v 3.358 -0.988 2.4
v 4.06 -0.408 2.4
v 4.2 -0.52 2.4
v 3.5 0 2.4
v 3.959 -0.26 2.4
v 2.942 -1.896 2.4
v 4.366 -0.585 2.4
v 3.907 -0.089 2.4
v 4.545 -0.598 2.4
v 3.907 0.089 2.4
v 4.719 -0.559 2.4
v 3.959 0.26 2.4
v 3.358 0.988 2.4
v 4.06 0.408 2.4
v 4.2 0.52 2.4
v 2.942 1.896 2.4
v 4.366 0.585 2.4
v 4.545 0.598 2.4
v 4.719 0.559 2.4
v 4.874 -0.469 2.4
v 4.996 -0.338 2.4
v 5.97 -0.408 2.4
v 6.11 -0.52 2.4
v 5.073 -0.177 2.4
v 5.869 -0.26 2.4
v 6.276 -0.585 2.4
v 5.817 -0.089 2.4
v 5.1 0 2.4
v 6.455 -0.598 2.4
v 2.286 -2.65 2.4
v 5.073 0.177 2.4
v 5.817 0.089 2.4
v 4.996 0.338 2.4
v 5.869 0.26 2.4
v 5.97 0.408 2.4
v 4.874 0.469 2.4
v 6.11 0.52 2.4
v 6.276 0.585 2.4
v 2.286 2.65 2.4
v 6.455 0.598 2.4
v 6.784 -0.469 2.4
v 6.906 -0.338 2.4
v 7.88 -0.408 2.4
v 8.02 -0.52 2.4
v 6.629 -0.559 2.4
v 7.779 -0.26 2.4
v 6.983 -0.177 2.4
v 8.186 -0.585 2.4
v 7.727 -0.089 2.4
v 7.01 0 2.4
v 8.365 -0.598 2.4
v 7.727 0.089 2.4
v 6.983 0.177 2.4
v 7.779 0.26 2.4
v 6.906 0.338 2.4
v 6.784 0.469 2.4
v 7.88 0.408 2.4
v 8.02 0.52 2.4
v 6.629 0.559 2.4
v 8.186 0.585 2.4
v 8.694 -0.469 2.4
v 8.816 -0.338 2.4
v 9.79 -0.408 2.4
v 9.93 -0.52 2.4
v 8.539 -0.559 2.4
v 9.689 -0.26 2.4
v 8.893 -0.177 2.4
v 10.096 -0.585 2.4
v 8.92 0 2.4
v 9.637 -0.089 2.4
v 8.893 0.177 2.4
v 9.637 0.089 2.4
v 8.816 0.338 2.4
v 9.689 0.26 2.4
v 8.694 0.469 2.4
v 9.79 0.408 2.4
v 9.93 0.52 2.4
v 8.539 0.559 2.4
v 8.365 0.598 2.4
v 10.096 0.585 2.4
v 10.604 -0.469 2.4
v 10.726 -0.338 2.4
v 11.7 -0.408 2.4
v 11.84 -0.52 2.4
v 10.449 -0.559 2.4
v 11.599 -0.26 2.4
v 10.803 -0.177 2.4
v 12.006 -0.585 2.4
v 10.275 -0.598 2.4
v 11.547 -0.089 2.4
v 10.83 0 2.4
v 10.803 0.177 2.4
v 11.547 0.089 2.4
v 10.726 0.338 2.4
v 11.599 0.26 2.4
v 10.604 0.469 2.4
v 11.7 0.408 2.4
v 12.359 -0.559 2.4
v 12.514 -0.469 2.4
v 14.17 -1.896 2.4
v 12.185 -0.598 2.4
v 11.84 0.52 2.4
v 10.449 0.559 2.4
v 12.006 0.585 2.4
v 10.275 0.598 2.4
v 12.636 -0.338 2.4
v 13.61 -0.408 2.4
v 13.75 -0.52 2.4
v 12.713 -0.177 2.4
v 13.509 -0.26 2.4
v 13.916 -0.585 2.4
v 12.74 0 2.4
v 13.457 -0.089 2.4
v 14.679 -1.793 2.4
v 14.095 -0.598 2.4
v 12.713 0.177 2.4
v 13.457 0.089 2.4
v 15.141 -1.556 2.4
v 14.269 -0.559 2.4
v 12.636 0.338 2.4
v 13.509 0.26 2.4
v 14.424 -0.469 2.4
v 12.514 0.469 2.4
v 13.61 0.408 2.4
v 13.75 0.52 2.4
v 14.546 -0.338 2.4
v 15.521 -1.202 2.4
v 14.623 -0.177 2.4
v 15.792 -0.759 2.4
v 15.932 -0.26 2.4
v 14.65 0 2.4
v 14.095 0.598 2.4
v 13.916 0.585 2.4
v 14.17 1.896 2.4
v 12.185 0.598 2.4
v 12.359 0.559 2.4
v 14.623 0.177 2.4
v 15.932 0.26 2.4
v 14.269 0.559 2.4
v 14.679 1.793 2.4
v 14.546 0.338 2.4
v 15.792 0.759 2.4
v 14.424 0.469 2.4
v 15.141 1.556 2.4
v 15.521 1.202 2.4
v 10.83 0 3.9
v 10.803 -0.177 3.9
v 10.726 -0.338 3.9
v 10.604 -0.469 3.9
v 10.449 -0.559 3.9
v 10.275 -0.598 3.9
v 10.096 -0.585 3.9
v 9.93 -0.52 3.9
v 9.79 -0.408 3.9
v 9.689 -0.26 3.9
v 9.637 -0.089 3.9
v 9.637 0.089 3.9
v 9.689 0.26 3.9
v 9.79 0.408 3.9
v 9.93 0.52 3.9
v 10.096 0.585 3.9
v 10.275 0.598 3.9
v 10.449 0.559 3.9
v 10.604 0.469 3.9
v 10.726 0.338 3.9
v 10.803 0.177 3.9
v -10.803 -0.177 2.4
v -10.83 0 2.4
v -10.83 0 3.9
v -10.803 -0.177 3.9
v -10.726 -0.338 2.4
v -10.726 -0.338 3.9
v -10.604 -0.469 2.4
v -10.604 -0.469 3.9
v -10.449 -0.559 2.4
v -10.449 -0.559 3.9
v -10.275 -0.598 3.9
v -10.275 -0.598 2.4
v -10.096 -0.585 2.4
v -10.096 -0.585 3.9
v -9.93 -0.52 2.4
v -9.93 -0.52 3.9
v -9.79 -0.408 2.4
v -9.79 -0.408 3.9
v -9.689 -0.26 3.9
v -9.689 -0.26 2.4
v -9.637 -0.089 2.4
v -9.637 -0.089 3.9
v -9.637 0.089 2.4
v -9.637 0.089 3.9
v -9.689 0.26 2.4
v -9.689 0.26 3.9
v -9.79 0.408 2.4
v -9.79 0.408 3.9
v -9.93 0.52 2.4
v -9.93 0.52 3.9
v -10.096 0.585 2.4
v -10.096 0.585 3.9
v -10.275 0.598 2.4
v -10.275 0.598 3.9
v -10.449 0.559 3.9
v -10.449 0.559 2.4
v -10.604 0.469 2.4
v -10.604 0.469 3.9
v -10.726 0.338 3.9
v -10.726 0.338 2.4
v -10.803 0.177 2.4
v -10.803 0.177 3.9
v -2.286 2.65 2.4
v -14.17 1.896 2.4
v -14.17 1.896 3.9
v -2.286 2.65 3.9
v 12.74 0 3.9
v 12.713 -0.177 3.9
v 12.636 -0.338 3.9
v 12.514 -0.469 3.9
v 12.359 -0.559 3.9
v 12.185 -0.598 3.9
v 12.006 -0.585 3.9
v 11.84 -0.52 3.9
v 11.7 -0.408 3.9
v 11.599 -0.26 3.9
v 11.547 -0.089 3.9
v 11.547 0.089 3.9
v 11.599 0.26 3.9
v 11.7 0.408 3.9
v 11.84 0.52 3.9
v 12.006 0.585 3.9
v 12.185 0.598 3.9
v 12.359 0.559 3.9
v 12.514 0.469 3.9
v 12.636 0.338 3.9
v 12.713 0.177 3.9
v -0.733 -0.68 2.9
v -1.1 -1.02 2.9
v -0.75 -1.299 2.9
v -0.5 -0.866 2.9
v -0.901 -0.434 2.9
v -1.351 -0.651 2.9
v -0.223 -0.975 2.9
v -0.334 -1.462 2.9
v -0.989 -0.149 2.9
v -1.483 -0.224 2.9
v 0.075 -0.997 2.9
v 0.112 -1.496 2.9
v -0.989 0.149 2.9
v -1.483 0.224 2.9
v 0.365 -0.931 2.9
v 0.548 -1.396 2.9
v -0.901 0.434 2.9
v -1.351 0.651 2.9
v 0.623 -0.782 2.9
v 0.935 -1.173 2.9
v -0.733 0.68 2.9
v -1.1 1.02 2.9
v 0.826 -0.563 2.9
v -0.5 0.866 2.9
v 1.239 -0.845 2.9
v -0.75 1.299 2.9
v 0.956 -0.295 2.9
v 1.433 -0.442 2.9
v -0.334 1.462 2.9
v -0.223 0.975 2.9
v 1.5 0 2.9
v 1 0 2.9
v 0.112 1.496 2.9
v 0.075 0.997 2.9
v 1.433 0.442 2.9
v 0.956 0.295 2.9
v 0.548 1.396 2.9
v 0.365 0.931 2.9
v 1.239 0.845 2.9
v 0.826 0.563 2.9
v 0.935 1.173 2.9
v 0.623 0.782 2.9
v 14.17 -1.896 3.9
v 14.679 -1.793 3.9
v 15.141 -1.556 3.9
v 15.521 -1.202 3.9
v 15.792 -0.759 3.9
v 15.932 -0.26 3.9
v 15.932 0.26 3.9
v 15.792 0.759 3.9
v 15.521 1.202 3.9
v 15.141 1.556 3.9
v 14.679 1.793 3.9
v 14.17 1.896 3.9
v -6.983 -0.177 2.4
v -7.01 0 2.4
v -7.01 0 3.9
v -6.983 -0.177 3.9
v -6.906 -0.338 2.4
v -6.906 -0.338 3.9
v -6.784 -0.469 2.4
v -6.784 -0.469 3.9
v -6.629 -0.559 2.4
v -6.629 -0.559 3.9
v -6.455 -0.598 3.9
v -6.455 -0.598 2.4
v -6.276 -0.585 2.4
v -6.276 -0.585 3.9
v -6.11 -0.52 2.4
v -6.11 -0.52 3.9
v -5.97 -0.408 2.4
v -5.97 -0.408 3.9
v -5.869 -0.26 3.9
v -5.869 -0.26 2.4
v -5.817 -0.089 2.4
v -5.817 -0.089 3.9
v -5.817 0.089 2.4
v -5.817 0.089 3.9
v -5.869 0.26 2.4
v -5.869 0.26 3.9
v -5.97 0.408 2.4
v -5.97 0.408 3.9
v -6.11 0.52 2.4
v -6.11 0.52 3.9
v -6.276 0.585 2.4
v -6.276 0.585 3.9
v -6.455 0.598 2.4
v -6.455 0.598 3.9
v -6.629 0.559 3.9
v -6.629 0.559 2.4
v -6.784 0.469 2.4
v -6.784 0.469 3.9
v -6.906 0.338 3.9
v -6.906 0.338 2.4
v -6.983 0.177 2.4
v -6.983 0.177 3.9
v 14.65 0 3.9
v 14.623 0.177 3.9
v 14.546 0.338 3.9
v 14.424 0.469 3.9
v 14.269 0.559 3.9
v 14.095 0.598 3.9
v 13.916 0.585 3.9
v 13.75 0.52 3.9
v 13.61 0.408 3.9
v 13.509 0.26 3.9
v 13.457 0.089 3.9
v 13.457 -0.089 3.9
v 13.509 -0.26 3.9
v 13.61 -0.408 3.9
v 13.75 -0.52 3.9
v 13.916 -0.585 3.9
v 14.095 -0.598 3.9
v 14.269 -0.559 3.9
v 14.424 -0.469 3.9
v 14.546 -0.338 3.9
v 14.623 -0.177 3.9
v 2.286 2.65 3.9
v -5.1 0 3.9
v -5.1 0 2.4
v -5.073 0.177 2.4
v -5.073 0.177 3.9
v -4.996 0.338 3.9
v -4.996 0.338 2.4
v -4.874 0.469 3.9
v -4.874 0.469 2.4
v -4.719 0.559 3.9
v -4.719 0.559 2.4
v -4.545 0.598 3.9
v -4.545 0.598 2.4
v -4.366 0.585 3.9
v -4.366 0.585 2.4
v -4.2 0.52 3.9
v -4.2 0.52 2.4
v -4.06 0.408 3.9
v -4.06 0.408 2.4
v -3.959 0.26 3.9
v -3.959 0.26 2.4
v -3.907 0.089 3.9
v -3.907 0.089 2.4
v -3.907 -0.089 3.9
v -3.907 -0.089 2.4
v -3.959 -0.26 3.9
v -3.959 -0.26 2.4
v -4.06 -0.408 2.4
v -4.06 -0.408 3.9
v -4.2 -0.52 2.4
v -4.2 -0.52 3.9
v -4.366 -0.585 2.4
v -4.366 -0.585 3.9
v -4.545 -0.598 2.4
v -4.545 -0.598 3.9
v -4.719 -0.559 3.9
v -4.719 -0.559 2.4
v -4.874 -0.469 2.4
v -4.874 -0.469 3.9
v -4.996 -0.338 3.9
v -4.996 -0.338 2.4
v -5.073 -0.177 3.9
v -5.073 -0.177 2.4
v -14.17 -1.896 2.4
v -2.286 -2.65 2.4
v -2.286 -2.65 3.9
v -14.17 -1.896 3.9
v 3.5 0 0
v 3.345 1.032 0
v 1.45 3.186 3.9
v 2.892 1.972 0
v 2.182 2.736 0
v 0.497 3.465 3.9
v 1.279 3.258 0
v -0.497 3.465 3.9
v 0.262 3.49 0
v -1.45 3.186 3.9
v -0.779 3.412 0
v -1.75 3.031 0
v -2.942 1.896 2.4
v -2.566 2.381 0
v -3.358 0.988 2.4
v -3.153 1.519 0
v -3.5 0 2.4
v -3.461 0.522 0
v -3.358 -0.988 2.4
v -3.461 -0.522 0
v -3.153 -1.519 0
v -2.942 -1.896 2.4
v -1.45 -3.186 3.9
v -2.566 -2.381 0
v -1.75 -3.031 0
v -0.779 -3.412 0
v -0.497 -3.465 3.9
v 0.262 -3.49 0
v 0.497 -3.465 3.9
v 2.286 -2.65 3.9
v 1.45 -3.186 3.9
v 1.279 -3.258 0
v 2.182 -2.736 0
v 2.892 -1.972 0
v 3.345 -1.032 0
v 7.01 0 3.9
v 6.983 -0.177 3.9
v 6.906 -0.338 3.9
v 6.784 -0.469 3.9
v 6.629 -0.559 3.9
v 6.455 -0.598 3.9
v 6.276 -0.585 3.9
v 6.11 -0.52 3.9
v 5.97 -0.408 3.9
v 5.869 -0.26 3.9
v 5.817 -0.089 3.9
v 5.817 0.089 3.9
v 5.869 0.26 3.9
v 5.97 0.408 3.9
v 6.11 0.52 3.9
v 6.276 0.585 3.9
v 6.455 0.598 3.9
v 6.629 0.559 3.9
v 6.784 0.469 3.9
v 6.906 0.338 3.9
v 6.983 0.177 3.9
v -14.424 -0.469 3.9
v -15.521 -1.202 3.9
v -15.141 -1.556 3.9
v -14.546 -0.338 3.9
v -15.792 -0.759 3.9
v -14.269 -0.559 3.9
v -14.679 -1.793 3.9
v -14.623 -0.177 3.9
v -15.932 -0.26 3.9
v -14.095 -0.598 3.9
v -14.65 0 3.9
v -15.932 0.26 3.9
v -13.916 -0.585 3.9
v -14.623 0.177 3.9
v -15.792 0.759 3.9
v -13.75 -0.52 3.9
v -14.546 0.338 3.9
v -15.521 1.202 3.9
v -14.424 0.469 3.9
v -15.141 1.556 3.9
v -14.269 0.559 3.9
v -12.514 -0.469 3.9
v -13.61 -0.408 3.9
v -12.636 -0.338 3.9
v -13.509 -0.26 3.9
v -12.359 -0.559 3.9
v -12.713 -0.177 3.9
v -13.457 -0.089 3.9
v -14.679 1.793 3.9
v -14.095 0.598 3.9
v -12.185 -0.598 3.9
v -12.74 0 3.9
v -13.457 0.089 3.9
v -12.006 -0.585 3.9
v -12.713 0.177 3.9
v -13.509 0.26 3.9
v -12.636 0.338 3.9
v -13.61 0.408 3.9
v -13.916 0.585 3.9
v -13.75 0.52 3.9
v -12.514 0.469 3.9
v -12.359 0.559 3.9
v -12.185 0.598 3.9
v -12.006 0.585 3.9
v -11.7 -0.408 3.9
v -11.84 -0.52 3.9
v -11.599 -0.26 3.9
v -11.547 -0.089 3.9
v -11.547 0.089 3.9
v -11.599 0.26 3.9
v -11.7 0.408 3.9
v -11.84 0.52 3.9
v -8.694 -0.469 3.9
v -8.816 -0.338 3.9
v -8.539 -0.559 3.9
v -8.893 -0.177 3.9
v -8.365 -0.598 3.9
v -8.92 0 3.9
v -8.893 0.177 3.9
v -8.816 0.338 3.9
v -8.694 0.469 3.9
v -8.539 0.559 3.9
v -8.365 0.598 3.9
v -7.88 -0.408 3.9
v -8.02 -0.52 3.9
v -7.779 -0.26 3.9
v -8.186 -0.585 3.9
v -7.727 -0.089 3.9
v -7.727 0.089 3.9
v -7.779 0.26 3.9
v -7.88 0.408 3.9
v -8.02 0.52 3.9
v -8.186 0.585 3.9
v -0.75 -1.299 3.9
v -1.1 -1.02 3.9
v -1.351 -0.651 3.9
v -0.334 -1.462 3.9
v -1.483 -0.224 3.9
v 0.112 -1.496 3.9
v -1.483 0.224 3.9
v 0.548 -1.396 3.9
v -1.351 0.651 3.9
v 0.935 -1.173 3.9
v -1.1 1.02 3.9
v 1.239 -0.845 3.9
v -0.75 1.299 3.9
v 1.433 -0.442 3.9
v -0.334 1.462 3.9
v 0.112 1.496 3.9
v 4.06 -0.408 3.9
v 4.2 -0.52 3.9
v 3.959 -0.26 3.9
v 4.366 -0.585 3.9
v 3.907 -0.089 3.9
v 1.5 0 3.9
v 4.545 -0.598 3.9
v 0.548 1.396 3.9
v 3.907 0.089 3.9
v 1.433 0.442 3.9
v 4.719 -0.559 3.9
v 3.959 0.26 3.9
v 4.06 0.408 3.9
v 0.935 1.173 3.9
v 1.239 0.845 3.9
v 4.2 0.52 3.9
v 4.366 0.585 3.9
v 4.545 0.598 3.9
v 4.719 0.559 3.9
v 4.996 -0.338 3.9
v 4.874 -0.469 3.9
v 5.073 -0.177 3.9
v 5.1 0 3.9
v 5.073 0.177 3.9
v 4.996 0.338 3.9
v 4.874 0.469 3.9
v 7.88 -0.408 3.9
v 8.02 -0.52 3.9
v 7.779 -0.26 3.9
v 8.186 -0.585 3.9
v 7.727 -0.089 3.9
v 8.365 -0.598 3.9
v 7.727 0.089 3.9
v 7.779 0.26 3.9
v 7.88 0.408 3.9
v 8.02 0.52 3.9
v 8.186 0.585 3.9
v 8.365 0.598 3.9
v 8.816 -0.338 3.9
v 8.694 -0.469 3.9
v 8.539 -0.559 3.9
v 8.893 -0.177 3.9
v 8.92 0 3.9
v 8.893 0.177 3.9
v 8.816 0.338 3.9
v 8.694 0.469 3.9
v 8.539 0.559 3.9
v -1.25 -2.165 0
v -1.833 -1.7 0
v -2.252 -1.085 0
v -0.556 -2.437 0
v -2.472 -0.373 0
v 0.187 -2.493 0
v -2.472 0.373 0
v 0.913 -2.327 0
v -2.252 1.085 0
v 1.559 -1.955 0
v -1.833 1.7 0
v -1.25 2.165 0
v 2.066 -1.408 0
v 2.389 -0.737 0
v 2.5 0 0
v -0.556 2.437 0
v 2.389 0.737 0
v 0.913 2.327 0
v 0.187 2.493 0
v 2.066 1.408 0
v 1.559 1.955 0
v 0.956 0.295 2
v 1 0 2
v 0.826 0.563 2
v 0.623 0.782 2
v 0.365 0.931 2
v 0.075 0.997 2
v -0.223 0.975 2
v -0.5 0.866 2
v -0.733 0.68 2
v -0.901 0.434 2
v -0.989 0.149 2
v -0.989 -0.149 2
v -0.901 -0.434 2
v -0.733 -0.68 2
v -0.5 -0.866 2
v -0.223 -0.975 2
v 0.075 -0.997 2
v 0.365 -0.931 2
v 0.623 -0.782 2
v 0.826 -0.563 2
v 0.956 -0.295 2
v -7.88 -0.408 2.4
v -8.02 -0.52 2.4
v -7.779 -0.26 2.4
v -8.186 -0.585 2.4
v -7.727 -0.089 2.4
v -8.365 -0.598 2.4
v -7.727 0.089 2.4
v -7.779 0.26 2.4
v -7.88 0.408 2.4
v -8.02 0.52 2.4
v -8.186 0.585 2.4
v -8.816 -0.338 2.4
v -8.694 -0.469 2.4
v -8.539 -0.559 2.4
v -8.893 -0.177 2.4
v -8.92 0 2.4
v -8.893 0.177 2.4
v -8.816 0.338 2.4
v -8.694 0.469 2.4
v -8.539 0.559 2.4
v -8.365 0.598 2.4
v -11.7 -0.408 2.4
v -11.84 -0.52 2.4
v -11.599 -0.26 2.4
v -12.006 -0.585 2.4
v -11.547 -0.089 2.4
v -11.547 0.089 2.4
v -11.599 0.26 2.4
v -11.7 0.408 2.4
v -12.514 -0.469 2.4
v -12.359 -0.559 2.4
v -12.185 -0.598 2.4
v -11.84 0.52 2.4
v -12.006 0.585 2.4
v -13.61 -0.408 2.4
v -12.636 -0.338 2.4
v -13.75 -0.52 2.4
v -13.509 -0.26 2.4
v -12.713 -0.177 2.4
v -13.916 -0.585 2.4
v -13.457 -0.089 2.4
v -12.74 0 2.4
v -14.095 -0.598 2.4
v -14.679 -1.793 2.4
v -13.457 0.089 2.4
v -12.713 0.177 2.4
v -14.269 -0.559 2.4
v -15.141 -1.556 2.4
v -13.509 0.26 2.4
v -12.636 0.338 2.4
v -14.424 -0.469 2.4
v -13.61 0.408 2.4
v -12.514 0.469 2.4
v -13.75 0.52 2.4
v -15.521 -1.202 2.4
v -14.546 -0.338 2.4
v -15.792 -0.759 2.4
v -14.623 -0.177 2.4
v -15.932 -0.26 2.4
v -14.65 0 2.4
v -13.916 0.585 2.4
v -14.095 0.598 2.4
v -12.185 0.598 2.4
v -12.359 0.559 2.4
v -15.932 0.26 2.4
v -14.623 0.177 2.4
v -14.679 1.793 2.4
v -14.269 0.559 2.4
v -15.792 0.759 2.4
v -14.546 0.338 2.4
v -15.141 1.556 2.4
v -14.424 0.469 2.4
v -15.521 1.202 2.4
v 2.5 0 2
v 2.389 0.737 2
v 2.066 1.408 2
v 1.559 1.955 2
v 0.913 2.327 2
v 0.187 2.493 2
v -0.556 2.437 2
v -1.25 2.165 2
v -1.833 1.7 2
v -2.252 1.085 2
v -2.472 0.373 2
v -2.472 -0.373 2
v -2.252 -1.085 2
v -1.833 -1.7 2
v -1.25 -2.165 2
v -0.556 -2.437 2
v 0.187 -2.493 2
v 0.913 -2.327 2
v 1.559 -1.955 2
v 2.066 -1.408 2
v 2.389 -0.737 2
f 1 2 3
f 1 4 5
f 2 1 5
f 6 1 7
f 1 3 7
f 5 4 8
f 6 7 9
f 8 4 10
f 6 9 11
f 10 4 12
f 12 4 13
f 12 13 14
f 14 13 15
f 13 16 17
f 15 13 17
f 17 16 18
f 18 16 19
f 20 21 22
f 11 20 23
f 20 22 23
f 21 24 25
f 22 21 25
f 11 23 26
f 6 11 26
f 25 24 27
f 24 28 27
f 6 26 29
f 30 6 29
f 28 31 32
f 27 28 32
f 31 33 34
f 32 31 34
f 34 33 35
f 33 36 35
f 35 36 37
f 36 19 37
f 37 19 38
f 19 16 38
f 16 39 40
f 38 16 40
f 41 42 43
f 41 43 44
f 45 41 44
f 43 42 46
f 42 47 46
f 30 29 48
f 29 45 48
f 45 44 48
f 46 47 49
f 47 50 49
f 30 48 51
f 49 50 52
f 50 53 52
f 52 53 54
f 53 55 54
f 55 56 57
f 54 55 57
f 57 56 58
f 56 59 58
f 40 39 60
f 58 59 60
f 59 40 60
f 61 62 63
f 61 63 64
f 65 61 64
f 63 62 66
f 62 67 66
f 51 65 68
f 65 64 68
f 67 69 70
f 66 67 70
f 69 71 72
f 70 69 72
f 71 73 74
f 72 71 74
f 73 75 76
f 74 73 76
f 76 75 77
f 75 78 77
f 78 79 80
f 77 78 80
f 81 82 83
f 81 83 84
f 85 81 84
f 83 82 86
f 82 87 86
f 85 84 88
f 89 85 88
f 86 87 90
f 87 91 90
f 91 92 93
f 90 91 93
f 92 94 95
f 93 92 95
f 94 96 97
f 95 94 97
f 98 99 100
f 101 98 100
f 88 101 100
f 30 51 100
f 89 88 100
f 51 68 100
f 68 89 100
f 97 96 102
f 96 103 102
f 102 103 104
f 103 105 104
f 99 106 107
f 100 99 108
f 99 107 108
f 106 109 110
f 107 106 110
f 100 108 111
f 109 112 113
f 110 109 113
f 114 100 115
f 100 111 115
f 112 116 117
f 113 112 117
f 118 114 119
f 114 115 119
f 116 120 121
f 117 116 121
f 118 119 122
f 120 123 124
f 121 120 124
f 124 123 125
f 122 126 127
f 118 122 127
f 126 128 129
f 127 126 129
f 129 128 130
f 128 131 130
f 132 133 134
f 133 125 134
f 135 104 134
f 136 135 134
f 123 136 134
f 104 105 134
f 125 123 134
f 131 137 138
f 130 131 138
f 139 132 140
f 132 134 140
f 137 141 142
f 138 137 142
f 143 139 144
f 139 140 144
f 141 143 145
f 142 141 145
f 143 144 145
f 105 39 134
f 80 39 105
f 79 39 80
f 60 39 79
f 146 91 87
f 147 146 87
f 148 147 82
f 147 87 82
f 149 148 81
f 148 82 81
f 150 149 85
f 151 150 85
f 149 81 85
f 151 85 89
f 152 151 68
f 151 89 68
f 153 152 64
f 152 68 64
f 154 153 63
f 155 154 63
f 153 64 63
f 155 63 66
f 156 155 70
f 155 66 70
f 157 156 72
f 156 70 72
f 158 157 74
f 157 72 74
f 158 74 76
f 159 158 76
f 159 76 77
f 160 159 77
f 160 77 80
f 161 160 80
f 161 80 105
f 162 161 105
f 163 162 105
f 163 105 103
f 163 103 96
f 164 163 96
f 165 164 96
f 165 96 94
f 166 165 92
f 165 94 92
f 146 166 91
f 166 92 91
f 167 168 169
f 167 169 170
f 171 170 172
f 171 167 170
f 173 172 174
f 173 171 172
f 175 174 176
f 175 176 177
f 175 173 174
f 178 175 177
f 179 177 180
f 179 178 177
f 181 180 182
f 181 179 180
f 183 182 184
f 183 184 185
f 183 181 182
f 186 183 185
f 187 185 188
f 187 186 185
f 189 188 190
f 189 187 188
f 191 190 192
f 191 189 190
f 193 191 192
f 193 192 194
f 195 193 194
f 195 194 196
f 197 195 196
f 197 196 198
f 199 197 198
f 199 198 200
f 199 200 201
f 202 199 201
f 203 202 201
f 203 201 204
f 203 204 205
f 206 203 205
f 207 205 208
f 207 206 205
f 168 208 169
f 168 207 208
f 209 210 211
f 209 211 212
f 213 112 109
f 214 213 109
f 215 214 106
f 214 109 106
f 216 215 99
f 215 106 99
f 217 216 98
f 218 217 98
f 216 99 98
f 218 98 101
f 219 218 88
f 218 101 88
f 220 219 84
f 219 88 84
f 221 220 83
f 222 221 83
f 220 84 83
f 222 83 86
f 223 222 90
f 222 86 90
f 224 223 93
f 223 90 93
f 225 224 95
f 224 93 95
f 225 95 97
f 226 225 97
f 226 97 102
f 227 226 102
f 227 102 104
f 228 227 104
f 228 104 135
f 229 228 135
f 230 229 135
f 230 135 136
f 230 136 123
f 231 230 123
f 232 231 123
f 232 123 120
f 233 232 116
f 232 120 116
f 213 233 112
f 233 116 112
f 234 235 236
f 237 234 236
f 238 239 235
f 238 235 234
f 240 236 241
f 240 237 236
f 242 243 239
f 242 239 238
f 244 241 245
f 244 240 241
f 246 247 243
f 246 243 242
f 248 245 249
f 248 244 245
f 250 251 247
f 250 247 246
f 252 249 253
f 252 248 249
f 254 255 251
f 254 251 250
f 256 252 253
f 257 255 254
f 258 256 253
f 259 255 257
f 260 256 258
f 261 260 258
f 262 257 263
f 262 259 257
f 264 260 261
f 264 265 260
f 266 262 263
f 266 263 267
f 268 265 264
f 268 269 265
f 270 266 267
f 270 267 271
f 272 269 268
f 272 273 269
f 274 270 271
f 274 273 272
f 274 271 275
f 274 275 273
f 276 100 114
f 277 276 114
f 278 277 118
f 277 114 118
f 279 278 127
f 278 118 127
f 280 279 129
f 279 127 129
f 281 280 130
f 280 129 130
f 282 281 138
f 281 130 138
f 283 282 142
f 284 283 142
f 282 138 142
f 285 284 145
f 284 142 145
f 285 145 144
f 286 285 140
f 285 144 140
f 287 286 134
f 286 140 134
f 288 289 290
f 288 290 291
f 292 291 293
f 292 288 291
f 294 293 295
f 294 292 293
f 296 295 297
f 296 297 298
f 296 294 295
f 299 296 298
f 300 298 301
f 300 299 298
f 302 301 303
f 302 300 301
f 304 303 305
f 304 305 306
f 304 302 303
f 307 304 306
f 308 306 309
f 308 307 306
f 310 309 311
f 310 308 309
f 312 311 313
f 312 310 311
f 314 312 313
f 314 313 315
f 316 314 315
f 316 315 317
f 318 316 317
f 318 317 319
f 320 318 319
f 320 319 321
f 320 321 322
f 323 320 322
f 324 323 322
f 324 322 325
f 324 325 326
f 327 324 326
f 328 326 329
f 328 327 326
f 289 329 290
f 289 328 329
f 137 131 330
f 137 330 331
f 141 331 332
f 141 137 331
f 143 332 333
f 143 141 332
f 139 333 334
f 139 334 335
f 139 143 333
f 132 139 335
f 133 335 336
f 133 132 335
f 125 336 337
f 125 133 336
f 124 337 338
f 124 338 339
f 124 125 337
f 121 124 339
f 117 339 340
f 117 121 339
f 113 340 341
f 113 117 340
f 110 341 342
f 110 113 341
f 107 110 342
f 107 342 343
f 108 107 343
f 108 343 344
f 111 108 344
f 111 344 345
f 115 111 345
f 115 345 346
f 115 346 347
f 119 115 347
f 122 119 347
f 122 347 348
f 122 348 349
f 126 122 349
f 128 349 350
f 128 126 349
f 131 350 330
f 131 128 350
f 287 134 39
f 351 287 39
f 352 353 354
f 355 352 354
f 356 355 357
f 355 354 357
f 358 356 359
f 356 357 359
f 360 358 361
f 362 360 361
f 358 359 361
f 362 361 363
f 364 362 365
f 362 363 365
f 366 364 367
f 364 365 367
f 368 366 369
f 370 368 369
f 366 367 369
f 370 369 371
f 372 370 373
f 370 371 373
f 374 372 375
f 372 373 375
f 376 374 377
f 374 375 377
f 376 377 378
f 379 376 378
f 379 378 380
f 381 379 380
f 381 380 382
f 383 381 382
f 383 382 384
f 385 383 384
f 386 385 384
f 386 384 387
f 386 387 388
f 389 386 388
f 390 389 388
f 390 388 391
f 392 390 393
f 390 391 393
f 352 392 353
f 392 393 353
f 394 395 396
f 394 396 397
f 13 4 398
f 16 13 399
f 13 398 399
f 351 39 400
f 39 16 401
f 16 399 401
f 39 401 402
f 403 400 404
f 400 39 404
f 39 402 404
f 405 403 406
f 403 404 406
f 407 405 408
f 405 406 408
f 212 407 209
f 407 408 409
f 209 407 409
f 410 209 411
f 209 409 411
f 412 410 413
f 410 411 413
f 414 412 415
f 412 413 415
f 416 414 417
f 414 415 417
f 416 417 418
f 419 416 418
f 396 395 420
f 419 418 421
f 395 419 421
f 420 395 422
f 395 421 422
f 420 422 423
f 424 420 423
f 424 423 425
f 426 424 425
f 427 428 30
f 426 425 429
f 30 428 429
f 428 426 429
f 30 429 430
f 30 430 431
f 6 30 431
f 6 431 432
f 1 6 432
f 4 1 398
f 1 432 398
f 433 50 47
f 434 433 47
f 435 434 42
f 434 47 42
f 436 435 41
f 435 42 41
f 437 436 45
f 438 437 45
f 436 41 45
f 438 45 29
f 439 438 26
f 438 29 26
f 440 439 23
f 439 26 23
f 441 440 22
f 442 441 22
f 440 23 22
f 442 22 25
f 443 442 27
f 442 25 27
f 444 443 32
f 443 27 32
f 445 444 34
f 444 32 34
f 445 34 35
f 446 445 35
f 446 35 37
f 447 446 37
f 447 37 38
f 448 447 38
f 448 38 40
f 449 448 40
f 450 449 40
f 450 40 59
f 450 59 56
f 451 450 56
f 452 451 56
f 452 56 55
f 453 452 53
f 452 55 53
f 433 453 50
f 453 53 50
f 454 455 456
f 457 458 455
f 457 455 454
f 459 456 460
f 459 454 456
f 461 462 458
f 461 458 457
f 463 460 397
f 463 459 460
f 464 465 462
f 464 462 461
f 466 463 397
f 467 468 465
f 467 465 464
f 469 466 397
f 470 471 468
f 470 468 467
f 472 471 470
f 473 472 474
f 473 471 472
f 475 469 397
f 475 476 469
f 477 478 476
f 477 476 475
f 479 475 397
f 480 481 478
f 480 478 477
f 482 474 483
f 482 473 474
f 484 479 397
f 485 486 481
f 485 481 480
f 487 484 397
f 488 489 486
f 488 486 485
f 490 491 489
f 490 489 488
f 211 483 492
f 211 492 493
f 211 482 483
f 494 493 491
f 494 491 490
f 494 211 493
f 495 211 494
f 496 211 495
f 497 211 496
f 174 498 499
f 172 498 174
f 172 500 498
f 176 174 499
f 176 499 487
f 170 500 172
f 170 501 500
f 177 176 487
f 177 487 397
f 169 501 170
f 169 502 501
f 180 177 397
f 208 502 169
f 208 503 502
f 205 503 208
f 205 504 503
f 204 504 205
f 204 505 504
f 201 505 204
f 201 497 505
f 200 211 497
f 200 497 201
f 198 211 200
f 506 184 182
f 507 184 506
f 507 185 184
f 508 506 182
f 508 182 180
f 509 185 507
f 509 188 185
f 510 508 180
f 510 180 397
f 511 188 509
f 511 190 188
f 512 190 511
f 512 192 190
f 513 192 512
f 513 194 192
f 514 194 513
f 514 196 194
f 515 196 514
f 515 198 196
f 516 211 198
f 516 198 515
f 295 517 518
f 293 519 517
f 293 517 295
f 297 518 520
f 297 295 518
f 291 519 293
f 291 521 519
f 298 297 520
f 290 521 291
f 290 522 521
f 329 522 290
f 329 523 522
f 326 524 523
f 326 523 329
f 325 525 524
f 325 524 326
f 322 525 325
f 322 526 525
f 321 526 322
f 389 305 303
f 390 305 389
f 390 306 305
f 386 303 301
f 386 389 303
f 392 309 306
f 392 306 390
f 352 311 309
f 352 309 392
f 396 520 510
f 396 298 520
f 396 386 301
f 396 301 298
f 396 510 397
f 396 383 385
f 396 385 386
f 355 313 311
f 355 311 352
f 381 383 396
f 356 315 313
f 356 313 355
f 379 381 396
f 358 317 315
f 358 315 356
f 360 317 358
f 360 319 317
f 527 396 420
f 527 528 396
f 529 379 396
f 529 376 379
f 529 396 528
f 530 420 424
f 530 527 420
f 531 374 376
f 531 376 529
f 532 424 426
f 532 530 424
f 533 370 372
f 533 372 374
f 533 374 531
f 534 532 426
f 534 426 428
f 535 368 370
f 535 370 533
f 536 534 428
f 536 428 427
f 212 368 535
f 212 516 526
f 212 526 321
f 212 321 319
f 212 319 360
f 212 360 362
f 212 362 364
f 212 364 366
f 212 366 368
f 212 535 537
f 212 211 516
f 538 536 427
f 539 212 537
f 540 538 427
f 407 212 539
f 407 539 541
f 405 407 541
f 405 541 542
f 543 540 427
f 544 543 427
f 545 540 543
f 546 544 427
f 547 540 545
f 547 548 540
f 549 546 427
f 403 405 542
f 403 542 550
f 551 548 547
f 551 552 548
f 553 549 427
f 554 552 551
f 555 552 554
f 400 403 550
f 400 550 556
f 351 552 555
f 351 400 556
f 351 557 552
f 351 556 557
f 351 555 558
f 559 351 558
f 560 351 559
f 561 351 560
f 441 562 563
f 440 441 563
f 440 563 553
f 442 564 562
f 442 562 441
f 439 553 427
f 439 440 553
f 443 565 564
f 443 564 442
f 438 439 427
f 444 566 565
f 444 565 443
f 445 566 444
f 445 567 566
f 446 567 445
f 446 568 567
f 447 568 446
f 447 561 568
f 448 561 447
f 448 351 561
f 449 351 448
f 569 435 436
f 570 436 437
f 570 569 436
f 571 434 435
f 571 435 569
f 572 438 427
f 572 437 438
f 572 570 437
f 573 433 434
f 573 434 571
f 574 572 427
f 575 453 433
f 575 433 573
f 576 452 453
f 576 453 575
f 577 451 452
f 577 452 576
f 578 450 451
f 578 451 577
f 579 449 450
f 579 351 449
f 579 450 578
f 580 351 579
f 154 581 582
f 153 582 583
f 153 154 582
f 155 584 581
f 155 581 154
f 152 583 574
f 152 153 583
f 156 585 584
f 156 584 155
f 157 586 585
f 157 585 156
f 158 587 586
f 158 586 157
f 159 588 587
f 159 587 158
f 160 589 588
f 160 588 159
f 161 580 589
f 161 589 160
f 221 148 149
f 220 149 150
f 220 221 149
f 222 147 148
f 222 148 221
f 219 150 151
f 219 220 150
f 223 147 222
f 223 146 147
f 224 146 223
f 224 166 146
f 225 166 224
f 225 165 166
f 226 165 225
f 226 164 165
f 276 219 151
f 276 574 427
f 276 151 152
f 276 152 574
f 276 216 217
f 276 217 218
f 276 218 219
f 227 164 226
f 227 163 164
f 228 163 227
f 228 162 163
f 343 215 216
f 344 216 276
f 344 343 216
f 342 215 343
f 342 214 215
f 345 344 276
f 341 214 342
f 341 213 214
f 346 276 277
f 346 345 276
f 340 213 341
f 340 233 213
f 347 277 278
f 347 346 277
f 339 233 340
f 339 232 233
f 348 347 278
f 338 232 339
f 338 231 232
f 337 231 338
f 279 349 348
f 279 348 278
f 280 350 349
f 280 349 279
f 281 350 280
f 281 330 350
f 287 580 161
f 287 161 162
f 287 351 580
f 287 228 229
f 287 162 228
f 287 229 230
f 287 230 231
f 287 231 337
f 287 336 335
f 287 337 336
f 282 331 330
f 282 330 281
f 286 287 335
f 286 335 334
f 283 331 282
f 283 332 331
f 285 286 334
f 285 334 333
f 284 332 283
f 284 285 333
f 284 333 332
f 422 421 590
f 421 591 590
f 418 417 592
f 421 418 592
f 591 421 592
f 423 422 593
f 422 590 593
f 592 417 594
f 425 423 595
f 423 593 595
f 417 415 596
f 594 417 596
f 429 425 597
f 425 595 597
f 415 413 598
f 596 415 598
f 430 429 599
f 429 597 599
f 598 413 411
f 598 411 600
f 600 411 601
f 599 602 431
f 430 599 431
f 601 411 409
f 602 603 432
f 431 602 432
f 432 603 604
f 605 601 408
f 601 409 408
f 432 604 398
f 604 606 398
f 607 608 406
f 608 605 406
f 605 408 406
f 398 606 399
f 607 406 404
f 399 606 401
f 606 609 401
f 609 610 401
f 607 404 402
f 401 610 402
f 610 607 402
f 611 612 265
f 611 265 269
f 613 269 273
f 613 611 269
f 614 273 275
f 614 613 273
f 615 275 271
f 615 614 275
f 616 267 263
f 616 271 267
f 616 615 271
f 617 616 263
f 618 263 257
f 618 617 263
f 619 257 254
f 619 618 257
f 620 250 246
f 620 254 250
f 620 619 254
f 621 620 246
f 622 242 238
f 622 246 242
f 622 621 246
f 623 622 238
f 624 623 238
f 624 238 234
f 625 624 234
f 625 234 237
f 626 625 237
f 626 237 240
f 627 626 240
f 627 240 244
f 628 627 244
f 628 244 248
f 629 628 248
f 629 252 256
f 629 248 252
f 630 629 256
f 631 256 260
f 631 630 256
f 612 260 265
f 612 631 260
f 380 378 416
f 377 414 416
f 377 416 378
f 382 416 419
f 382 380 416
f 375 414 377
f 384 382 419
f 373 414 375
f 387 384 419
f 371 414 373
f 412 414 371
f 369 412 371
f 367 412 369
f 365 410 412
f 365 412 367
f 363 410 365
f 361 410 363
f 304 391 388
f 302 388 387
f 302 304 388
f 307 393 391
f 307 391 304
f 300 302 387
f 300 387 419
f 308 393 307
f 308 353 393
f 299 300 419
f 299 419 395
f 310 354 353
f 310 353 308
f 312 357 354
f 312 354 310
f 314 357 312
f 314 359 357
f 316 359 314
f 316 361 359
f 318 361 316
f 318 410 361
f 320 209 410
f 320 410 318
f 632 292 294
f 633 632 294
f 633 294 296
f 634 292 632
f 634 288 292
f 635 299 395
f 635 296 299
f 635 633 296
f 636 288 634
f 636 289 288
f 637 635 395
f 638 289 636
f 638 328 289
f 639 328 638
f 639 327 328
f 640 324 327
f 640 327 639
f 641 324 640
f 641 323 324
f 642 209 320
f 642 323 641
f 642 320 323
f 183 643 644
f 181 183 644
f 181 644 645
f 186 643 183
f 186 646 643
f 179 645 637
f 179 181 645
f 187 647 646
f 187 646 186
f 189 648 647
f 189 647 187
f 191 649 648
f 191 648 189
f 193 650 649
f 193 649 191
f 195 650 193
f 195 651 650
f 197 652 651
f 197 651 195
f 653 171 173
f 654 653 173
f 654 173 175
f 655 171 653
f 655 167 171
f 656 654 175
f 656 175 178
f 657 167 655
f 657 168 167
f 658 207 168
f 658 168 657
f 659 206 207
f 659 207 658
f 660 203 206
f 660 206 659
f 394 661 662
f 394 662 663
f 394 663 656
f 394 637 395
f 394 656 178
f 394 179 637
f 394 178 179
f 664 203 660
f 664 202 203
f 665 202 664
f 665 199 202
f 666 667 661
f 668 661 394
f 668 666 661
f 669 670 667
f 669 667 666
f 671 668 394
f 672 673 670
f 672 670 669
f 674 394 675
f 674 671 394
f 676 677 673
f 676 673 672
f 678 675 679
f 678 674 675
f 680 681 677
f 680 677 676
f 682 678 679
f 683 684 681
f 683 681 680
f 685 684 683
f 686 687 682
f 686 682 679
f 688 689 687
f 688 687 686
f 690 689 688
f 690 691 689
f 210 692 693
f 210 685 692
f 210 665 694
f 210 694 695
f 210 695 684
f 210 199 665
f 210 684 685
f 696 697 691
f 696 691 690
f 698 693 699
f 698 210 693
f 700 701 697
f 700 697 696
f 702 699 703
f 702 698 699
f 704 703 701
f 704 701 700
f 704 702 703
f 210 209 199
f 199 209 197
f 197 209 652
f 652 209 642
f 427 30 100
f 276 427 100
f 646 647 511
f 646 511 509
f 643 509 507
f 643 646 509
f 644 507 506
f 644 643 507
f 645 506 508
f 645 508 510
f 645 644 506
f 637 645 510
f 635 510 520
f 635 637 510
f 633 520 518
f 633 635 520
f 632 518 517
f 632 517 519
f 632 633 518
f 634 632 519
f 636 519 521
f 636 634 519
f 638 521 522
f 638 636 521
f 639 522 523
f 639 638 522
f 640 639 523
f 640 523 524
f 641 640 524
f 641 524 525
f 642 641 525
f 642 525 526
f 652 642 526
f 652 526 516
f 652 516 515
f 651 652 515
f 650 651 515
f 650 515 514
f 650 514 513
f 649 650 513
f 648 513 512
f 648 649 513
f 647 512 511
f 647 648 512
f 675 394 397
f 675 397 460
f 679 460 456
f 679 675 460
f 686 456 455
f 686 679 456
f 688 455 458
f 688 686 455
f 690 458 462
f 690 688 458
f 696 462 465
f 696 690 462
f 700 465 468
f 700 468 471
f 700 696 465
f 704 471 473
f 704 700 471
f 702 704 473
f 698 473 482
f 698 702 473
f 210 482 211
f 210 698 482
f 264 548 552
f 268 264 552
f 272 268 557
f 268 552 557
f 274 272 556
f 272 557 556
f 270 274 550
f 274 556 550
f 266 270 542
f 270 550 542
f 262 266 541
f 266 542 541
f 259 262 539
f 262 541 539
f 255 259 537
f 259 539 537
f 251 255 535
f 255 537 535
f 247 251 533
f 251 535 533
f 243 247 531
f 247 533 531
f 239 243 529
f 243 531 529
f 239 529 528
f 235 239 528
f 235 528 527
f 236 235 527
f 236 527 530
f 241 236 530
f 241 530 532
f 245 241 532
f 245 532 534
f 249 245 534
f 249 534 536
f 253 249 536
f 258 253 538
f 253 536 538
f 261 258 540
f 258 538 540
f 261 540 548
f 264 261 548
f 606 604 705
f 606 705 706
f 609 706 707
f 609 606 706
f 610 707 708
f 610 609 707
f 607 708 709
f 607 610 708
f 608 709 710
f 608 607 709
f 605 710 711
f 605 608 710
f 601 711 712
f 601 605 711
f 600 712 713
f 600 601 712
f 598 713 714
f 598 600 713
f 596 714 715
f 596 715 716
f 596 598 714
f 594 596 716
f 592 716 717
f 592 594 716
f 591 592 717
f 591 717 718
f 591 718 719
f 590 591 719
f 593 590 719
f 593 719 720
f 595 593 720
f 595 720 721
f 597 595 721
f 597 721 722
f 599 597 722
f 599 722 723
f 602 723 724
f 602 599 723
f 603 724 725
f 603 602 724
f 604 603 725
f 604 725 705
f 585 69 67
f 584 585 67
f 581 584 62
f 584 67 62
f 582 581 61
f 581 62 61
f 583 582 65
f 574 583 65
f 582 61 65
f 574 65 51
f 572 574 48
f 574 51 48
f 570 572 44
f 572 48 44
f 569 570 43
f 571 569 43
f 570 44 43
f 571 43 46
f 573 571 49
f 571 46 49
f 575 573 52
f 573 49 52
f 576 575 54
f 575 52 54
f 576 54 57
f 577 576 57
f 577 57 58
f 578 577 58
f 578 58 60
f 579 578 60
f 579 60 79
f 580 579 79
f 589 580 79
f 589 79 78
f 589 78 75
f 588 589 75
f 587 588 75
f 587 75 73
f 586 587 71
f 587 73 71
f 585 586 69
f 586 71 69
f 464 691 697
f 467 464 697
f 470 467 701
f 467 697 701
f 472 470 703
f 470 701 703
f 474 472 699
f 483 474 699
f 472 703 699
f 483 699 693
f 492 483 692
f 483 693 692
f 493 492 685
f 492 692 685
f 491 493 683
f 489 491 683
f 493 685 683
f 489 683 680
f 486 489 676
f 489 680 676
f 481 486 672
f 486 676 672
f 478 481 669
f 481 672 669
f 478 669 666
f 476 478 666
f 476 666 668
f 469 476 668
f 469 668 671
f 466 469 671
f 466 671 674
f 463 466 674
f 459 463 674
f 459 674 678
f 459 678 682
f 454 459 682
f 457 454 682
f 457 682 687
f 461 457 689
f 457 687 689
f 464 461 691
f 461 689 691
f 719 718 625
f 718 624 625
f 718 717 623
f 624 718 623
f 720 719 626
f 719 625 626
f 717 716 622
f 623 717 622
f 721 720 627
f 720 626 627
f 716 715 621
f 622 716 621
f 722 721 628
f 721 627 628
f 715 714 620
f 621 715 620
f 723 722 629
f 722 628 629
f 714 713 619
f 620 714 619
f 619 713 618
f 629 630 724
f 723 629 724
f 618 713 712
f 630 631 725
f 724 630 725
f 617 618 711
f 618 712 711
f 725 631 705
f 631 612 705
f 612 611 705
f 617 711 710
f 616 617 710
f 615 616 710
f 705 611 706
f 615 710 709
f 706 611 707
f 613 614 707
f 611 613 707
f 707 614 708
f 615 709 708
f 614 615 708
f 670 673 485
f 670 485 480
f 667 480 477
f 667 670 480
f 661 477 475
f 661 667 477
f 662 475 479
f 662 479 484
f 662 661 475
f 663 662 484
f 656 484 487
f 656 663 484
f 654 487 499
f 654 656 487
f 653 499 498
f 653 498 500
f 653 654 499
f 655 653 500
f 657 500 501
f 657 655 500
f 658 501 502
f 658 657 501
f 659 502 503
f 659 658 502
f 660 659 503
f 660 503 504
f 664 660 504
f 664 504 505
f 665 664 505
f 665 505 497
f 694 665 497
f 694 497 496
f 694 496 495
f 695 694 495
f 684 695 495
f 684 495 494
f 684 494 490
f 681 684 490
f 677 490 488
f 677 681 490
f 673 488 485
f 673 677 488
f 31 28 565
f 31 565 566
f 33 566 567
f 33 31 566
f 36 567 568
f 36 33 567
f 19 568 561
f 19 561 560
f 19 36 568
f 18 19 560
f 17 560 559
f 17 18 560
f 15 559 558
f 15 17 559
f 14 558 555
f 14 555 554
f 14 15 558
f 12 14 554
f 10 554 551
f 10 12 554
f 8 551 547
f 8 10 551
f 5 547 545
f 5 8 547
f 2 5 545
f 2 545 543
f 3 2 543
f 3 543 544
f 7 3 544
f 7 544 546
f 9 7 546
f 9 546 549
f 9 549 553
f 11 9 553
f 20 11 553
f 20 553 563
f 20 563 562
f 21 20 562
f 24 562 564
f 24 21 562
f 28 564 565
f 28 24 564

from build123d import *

# Parameters (mm, degrees)
SKETCH_1_R          = 3.5
EXTRUDE_1_DEPTH     = 3.9
EXTRUDE_START       = 2.4
SKETCH_1_6_R        = 0.6
EXTRUDE_2_DEPTH     = 1.5
SKETCH_1_3_R        = 2.5
CUT_EXTRUDE_1_DEPTH = 2
CUT_EXTRUDE_START   = 3.9
SKETCH_1_4_R        = 1.5
CUT_EXTRUDE_2_DEPTH = 1
SKETCH_1_5_R        = 1
CUT_EXTRUDE_3_DEPTH = 17.788761122


with BuildPart() as part:
    # 草图1 → 凸台-拉伸1 (new body)
    with BuildSketch(Plane.XY):
        Circle(SKETCH_1_R)
    extrude(amount=EXTRUDE_1_DEPTH)

    # 草图1<6> → 凸台-拉伸2 (add)
    with BuildSketch(Plane.XY.offset(EXTRUDE_START)):
        with BuildLine():
            Line((14.170277633, 1.89618915), (2.286372673, 2.65))
            ThreePointArc((2.286372673, 2.65), (3.5, 0), (2.286372673, -2.65))
            Line((2.286372673, -2.65), (14.170277633, -1.89618915))
            ThreePointArc((14.170277633, -1.89618915), (15.95, 0), (14.170277633, 1.89618915))
        make_face()
        with BuildLine():
            ThreePointArc((11.54, 0), (12.14, 0.6), (12.74, 0))
            ThreePointArc((12.74, 0), (12.14, -0.6), (11.54, 0))
        make_face(mode=Mode.SUBTRACT)
        with Locations((4.5, 0)):
            Circle(SKETCH_1_6_R, mode=Mode.SUBTRACT)
        with BuildLine():
            ThreePointArc((5.81, 0), (6.41, 0.6), (7.01, 0))
            ThreePointArc((7.01, 0), (6.41, -0.6), (5.81, 0))
        make_face(mode=Mode.SUBTRACT)
        with BuildLine():
            ThreePointArc((7.72, 0), (8.32, 0.6), (8.92, 0))
            ThreePointArc((8.92, 0), (8.32, -0.6), (7.72, 0))
        make_face(mode=Mode.SUBTRACT)
        with BuildLine():
            ThreePointArc((9.63, 0), (10.23, 0.6), (10.83, 0))
            ThreePointArc((10.83, 0), (10.23, -0.6), (9.63, 0))
        make_face(mode=Mode.SUBTRACT)
        with Locations((14.05, 0)):
            Circle(SKETCH_1_6_R, mode=Mode.SUBTRACT)
    extrude_2 = extrude(amount=EXTRUDE_2_DEPTH)

    # 镜向1: 凸台-拉伸2 across plane
    add(extrude_2.mirror(Plane(origin=(0, 0, 0), x_dir=(0, 0, 1), z_dir=(1, 0, 0))))

    # 草图1<3> → 切除-拉伸1 (cut)
    with BuildSketch(Plane.XY):
        Circle(SKETCH_1_3_R)
    extrude(amount=CUT_EXTRUDE_1_DEPTH, mode=Mode.SUBTRACT)

    # 草图1<4> → 切除-拉伸2 (cut)
    with BuildSketch(Plane.XY.offset(CUT_EXTRUDE_START)):
        Circle(SKETCH_1_4_R)
    extrude(amount=-CUT_EXTRUDE_2_DEPTH, mode=Mode.SUBTRACT)

    # 草图1<5> → 切除-拉伸3 (cut, through all)
    with BuildSketch(Plane.XY):
        Circle(SKETCH_1_5_R)
    extrude(amount=CUT_EXTRUDE_3_DEPTH, mode=Mode.SUBTRACT)


solid = part.part
